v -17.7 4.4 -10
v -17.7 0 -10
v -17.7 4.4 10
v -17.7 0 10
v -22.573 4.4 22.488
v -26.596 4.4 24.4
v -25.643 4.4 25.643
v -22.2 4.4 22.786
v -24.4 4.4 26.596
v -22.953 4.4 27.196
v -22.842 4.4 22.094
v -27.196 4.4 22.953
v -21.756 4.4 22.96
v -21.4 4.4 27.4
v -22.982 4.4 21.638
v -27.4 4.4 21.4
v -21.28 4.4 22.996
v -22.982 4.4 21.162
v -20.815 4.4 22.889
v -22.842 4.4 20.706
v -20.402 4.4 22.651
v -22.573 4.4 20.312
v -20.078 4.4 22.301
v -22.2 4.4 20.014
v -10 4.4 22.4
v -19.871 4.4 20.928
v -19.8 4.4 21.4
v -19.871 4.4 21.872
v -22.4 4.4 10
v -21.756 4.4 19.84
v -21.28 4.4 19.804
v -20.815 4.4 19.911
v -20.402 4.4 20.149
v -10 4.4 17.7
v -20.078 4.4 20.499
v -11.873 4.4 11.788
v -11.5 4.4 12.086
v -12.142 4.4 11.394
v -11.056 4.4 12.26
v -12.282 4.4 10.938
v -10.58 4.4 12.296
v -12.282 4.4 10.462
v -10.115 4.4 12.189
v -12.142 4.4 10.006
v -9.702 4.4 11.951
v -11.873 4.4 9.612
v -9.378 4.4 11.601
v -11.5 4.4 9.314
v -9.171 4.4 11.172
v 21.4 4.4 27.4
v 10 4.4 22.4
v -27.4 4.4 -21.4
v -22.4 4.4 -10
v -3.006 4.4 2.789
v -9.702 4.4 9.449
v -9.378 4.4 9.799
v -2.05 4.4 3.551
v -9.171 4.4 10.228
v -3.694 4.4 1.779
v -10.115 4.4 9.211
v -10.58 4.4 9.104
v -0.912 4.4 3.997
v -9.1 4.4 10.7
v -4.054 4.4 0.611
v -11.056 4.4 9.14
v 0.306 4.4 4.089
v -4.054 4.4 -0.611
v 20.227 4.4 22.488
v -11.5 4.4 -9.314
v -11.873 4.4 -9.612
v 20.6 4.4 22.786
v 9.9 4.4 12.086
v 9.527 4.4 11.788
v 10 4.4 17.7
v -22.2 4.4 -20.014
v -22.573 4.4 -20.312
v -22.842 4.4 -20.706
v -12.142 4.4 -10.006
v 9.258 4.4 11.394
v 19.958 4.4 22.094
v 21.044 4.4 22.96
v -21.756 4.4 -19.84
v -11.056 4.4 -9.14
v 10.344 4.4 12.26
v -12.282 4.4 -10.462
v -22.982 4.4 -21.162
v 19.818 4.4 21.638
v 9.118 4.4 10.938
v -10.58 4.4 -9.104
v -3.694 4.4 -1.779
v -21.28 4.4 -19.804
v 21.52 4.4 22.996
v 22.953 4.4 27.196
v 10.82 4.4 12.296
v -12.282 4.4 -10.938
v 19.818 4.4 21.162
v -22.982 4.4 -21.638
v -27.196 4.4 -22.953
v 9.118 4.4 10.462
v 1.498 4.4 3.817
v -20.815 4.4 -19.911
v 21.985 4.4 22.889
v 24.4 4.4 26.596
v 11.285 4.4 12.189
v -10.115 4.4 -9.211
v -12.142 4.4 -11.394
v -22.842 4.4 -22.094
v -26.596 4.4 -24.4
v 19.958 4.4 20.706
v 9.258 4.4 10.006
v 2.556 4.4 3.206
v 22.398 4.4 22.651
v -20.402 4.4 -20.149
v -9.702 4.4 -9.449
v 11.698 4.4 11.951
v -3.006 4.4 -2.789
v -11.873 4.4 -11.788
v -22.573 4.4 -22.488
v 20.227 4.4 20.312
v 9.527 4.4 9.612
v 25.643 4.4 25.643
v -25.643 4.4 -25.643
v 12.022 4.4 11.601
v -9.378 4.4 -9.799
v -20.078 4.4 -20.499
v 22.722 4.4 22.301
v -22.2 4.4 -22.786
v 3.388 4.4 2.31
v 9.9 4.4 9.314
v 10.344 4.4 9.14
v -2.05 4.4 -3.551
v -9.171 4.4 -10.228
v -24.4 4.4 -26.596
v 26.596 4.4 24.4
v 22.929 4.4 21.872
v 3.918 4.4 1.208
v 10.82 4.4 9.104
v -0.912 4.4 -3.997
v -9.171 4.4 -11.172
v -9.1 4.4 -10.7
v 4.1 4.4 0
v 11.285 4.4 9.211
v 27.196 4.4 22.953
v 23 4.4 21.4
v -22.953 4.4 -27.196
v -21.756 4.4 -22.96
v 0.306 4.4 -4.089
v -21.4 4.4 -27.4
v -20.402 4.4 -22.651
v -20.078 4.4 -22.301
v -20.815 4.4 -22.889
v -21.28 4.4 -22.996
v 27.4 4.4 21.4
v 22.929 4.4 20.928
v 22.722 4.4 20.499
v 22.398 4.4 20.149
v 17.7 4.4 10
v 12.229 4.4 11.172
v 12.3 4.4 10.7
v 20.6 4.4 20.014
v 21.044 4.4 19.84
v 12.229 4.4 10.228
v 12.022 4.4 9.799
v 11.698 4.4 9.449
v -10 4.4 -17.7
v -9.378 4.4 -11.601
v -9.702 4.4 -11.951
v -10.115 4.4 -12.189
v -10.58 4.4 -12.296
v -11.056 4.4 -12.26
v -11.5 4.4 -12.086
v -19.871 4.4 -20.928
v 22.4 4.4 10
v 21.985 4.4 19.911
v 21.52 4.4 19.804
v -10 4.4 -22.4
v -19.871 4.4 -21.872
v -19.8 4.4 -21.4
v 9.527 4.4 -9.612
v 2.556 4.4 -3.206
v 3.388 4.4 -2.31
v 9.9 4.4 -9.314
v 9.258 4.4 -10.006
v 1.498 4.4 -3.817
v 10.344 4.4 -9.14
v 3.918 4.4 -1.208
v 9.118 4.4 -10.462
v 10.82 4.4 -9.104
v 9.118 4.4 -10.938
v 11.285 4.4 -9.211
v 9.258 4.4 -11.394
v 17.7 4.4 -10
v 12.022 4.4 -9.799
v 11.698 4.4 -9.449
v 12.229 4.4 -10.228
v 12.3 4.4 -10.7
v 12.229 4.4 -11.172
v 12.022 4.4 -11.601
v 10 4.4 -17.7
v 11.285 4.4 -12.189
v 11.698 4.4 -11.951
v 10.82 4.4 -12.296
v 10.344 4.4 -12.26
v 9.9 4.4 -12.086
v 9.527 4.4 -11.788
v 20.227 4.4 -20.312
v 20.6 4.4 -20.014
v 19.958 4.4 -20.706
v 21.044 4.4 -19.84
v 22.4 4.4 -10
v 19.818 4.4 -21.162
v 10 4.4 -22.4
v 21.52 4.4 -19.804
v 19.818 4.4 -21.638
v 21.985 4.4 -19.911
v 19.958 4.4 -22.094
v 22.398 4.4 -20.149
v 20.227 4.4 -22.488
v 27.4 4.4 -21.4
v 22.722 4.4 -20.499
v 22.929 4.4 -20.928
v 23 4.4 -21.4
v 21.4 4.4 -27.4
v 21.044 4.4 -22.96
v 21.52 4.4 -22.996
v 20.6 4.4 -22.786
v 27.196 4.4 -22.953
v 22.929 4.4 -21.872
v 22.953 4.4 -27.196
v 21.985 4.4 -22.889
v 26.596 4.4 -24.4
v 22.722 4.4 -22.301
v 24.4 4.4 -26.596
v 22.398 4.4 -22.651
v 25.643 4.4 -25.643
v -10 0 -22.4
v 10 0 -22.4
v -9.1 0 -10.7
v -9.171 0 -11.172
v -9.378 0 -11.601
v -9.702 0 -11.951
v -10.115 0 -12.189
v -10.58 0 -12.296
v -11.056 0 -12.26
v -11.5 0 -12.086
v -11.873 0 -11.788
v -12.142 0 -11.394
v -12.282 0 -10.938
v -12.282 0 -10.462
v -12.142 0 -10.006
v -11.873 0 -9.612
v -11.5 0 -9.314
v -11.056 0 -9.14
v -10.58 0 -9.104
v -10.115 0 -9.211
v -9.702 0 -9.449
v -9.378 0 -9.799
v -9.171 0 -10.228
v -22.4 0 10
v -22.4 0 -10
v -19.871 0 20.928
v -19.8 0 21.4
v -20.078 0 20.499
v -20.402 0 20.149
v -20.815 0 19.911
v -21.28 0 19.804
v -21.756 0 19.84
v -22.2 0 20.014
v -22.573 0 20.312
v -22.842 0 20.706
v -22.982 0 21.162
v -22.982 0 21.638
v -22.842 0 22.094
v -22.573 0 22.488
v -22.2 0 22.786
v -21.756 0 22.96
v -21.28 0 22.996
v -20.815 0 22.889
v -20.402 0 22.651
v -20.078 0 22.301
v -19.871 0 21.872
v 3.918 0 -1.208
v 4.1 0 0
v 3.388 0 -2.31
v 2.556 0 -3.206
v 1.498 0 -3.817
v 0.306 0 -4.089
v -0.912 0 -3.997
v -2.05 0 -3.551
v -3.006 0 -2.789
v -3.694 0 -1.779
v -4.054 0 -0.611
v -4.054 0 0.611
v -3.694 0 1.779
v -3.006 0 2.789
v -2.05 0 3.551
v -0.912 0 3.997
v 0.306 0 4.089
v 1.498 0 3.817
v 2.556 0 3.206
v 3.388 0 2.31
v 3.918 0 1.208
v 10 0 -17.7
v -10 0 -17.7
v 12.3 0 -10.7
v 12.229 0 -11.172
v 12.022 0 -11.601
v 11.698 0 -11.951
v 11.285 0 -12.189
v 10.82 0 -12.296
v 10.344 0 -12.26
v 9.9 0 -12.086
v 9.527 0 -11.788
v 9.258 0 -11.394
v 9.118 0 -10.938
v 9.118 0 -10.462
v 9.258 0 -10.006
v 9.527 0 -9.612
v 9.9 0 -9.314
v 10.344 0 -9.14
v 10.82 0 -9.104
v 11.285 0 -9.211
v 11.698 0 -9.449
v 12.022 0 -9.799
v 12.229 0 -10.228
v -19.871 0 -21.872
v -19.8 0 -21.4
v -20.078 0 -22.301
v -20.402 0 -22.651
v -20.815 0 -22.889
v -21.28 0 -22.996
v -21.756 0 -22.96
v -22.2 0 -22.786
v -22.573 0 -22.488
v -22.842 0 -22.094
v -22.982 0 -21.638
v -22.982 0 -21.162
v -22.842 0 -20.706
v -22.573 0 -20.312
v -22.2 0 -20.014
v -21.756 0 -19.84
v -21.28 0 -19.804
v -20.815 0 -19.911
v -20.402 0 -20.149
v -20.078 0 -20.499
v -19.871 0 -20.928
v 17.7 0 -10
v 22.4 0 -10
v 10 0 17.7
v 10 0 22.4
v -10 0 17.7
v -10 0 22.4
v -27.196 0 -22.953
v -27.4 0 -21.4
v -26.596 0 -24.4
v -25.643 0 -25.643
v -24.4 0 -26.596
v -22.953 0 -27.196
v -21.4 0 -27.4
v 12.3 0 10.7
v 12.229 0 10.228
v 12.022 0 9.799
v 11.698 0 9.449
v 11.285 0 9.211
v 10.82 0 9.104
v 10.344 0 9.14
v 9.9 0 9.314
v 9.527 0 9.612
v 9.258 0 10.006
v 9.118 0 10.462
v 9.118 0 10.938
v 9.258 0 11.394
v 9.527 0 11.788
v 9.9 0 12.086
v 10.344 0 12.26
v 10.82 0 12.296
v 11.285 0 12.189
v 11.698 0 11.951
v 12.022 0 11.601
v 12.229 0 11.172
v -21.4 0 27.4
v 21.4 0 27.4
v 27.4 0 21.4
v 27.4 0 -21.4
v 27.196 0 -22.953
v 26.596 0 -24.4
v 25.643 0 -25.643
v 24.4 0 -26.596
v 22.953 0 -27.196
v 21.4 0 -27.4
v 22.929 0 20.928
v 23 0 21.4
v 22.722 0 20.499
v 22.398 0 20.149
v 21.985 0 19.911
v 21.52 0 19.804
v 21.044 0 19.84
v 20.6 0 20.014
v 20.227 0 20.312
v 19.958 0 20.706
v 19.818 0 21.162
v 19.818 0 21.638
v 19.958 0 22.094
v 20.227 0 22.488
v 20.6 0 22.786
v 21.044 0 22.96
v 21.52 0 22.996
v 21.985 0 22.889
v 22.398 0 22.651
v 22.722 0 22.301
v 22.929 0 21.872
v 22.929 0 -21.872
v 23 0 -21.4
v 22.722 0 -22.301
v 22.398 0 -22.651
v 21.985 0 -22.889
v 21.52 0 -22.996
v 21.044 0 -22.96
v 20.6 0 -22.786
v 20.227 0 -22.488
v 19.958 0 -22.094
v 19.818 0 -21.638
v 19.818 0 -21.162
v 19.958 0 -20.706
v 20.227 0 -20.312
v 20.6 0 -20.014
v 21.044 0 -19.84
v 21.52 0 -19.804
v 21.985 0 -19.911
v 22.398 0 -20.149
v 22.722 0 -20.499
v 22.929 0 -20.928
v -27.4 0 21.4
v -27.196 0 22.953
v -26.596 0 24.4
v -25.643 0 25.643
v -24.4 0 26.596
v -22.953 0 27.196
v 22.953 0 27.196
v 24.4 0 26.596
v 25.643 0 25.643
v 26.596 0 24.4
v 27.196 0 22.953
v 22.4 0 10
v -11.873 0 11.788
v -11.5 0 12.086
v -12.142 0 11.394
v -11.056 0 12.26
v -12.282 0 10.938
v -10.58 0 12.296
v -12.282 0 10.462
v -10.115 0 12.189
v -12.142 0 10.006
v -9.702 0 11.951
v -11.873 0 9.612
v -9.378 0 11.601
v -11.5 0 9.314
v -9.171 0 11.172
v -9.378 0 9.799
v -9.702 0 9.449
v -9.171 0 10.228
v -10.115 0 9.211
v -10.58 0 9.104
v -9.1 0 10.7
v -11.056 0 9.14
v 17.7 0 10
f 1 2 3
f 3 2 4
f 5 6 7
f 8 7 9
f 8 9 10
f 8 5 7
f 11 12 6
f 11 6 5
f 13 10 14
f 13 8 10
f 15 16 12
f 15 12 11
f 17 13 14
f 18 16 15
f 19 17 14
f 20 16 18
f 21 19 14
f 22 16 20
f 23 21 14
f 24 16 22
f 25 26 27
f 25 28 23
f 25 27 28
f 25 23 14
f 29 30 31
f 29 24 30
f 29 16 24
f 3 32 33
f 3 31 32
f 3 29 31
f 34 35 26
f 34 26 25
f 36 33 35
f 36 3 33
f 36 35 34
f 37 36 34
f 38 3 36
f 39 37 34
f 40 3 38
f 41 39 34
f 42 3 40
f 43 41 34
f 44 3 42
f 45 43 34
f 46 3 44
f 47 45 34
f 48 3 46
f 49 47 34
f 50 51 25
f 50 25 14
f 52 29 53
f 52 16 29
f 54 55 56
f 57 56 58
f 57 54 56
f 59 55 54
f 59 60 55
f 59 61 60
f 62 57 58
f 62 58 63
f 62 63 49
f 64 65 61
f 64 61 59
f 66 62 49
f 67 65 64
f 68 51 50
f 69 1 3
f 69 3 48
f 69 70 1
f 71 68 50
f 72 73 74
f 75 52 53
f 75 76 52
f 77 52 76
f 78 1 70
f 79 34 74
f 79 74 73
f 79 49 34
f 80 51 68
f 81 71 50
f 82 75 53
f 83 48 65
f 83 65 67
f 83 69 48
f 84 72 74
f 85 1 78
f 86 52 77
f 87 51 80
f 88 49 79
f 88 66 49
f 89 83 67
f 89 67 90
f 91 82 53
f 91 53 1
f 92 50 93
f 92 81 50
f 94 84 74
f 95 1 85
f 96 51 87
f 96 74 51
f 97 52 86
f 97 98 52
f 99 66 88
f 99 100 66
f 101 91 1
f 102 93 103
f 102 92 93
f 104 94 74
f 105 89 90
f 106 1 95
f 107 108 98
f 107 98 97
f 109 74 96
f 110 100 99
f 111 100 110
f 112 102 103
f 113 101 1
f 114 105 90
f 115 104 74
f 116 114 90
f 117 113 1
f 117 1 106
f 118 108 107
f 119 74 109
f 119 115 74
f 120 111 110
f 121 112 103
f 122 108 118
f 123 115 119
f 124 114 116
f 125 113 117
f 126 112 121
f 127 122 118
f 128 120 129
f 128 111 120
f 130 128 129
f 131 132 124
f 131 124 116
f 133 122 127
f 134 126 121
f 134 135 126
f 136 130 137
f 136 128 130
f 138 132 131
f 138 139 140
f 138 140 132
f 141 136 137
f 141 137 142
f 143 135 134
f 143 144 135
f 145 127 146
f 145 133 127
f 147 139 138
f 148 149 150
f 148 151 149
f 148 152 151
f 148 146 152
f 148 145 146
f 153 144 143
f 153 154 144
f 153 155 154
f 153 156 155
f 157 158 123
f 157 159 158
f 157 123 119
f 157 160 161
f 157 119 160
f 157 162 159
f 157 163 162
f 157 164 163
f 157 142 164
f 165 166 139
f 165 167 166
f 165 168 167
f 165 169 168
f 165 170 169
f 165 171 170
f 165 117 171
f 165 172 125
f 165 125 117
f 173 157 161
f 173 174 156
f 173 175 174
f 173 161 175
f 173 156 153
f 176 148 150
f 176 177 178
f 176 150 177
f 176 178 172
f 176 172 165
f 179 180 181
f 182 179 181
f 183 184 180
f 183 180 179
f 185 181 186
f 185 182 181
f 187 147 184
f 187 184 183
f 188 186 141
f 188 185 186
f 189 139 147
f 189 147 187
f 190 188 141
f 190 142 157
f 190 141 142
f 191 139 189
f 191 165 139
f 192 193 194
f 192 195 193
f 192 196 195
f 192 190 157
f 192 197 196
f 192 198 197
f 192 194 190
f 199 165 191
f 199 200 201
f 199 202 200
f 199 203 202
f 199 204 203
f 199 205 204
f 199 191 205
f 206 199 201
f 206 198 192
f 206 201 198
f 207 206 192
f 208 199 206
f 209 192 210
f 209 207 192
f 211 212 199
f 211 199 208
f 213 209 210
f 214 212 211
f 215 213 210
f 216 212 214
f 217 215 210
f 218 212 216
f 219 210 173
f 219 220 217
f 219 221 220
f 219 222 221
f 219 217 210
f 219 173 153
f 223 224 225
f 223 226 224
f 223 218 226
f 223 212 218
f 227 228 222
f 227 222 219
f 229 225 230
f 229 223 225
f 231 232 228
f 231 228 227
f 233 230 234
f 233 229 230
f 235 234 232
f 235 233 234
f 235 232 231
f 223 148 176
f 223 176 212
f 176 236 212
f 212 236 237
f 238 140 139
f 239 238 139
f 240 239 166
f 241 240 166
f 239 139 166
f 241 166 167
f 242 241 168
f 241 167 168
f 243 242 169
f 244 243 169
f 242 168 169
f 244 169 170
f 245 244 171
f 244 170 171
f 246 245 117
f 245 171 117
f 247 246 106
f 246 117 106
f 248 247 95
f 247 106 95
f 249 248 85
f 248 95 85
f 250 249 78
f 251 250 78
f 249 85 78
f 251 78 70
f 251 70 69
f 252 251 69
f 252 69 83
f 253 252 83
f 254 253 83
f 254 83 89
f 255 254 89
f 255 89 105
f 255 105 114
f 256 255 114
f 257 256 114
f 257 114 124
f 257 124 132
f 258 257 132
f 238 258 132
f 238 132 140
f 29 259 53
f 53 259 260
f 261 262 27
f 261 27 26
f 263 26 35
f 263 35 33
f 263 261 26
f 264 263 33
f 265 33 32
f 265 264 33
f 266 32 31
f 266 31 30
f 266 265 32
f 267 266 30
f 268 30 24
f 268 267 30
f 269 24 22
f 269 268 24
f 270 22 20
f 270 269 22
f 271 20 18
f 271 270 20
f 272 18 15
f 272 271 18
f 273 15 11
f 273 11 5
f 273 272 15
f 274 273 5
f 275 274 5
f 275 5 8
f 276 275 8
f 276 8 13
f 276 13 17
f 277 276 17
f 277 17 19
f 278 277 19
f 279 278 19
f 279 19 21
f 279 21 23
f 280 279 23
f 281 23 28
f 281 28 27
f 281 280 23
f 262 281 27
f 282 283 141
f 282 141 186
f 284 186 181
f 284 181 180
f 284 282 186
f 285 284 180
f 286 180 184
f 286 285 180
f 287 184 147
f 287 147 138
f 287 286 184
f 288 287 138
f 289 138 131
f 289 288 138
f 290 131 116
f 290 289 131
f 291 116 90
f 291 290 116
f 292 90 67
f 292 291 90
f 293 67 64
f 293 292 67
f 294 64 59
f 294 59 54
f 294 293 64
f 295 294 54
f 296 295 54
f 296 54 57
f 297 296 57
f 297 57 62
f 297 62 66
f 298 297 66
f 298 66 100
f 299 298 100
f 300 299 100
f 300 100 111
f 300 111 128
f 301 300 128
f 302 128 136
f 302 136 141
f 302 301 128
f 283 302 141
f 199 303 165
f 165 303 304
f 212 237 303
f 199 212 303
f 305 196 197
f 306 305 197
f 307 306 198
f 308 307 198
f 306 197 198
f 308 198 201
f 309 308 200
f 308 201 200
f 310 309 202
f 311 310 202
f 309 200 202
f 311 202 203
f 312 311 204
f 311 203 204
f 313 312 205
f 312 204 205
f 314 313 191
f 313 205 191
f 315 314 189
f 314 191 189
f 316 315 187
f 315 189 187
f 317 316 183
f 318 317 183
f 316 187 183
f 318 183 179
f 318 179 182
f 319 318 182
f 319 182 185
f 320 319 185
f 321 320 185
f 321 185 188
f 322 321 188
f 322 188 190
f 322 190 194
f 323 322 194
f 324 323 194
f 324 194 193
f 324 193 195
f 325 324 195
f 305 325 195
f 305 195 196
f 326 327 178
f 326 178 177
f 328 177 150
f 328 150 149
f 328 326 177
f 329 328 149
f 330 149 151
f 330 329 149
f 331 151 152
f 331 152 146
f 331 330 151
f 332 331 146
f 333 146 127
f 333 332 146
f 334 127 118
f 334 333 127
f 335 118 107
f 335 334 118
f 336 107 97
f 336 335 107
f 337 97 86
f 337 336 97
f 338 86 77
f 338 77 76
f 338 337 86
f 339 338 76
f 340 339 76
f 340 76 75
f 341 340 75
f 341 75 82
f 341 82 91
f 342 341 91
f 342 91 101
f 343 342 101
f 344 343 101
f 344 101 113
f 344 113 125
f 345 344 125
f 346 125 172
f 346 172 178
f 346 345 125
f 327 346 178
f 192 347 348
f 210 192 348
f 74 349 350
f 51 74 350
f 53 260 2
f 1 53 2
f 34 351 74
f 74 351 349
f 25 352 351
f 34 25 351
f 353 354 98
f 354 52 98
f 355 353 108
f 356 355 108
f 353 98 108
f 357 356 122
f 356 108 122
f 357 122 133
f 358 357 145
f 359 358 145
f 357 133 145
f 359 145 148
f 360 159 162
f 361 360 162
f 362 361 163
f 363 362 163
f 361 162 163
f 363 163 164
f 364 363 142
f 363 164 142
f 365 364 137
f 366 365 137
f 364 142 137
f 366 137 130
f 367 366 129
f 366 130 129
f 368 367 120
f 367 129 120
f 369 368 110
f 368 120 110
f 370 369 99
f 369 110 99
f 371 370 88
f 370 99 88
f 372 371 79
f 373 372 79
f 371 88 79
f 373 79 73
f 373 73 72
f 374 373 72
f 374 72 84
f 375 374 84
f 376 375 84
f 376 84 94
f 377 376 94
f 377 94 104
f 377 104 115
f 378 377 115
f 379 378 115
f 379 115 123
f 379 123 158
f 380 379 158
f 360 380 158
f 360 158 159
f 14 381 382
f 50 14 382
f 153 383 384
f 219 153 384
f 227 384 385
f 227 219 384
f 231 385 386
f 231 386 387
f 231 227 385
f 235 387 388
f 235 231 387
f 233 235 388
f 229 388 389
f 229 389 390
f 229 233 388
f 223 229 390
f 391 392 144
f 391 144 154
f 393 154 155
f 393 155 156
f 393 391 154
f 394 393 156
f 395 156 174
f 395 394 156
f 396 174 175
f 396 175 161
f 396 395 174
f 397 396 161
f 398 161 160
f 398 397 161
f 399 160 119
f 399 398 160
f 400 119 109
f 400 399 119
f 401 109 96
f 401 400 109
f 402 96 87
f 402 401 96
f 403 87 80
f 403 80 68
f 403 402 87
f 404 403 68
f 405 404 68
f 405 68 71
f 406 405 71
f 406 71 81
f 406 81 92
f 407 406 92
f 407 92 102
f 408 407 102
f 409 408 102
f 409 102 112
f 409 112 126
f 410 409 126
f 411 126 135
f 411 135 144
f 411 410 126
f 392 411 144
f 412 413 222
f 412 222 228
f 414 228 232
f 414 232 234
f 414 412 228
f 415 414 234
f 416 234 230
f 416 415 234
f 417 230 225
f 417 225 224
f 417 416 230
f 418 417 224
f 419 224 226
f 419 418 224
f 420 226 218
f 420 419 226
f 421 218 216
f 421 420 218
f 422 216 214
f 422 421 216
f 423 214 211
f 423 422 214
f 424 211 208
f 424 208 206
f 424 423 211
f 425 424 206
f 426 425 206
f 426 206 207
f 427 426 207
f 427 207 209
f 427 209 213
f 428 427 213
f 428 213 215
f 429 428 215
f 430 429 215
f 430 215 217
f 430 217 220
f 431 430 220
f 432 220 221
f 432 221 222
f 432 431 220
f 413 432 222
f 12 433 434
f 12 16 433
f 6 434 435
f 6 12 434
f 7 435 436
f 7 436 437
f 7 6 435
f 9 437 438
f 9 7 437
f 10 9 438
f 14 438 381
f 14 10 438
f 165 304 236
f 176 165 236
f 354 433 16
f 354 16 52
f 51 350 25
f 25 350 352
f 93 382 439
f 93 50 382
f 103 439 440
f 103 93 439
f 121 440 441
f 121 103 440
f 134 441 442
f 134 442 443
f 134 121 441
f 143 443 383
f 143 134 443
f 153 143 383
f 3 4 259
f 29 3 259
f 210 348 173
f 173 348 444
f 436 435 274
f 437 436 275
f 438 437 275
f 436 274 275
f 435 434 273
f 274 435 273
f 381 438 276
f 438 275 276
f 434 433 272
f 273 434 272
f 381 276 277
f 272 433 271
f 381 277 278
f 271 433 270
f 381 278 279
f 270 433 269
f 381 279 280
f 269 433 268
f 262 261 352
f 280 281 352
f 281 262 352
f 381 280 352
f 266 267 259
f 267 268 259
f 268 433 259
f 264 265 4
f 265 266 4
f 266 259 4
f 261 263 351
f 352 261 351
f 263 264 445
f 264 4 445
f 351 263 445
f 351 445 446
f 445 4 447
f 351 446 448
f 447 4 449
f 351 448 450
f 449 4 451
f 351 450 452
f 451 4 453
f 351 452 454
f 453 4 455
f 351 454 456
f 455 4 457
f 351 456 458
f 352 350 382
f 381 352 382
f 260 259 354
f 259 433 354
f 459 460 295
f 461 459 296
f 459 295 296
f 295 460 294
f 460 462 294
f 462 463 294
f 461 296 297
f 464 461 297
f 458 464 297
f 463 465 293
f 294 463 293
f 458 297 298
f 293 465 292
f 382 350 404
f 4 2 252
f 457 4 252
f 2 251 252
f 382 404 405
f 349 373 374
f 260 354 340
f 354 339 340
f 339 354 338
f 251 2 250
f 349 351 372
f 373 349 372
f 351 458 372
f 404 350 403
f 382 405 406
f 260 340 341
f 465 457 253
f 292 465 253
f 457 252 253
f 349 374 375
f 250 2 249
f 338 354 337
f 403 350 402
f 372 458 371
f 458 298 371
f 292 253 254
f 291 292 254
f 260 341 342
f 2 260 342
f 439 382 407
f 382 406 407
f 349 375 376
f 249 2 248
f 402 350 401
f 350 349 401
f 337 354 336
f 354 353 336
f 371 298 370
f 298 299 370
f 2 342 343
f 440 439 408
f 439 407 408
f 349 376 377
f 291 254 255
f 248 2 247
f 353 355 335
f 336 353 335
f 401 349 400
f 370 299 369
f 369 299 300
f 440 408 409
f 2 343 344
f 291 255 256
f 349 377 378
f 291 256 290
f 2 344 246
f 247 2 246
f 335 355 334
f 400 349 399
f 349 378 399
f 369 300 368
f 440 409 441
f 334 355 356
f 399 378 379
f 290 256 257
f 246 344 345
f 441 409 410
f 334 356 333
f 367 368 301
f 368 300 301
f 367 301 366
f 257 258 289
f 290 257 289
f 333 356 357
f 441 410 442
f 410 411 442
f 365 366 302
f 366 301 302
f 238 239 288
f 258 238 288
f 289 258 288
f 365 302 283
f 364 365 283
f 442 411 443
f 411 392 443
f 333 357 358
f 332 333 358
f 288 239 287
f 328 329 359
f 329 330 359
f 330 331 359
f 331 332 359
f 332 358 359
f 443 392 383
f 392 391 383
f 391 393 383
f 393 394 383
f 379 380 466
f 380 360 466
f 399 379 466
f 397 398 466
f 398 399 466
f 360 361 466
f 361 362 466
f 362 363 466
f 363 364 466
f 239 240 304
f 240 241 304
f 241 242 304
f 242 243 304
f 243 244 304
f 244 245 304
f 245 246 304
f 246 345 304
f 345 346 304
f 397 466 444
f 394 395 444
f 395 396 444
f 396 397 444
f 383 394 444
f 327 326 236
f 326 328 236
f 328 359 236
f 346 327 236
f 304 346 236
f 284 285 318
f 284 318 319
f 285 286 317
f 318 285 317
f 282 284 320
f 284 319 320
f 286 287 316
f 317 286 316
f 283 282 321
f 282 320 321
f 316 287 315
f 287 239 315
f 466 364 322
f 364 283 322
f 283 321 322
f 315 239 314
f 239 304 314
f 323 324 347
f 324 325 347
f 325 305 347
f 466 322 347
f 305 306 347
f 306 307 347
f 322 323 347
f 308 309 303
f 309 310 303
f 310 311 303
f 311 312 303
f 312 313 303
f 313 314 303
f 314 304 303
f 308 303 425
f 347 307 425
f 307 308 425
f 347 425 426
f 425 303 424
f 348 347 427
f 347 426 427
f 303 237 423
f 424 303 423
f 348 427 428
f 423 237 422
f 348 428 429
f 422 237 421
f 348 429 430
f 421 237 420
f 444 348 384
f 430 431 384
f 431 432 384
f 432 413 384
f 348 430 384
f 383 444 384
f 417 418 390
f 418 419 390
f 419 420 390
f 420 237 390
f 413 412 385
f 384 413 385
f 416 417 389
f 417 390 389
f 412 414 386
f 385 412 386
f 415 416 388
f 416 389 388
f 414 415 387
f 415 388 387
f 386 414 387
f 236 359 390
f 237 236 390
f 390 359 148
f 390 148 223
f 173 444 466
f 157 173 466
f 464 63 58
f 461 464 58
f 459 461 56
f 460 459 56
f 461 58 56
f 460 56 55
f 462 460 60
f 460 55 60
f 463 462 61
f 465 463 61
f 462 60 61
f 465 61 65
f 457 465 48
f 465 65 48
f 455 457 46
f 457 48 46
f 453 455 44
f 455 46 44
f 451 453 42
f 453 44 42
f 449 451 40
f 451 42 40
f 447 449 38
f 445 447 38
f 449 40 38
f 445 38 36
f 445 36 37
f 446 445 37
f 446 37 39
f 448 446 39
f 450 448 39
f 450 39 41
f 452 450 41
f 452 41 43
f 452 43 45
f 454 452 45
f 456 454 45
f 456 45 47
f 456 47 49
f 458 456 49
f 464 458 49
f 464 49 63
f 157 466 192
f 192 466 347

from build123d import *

# Parameters (mm, degrees)
SKETCH_1_W          = 54.8
SKETCH_1_H          = 54.8
SKETCH_1_R          = 4.1
SKETCH_1_R_2        = 1.6
EXTRUDE_1_DEPTH     = 4.4
FILLET_1_R          = 6
SKETCH_2_R          = 1.6
CUT_EXTRUDE_1_DEPTH = 10


with BuildPart() as part:
    # 草图1 → 凸台-拉伸1 (new body)
    with BuildSketch(Plane(origin=(0, 0, 0), x_dir=(1, 0, 0), z_dir=(0, 1, 0))):
        Rectangle(SKETCH_1_W, SKETCH_1_H)
        Circle(SKETCH_1_R, mode=Mode.SUBTRACT)
        with Locations((21.4, 21.4)):
            Circle(SKETCH_1_R_2, mode=Mode.SUBTRACT)
        with Locations((21.4, -21.4)):
            Circle(SKETCH_1_R_2, mode=Mode.SUBTRACT)
        with Locations((-21.4, -21.4)):
            Circle(SKETCH_1_R_2, mode=Mode.SUBTRACT)
        with Locations((-21.4, 21.4)):
            Circle(SKETCH_1_R_2, mode=Mode.SUBTRACT)
        Polygon((17.7, -5), (17.7, 5), (17.7, 10), (22.4, 10), (22.4, 5), (22.4, -5), (22.4, -10), (17.7, -10), align=None, mode=Mode.SUBTRACT)
        Polygon((-5, 17.7), (-10, 17.7), (-10, 22.4), (-5, 22.4), (5, 22.4), (10, 22.4), (10, 17.7), (5, 17.7), align=None, mode=Mode.SUBTRACT)
        Polygon((5, -17.7), (10, -17.7), (10, -22.4), (5, -22.4), (-5, -22.4), (-10, -22.4), (-10, -17.7), (-5, -17.7), align=None, mode=Mode.SUBTRACT)
        Polygon((-17.7, 5), (-17.7, -5), (-17.7, -10), (-22.4, -10), (-22.4, -5), (-22.4, 5), (-22.4, 10), (-17.7, 10), align=None, mode=Mode.SUBTRACT)
    extrude(amount=EXTRUDE_1_DEPTH)

    # 圆角1
    fillet_1_edges = [part.edges().sort_by_distance(p)[0] for p in [
        (27.4, 2.2, 27.4),
        (-27.4, 2.2, 27.4),
        (-27.4, 2.2, -27.4),
        (27.4, 2.2, -27.4),
    ]]
    fillet(fillet_1_edges, radius=FILLET_1_R)

    # 草图2 → 切除-拉伸1 (cut)
    with BuildSketch(Plane(origin=(0, 4.4, 0), x_dir=(1, 0, 0), z_dir=(0, 1, 0))):
        with Locations((10.7, 10.7)):
            Circle(SKETCH_2_R)
        with Locations((10.7, -10.7)):
            Circle(SKETCH_2_R)
        with Locations((-10.7, -10.7)):
            Circle(SKETCH_2_R)
        with Locations((-10.7, 10.7)):
            Circle(SKETCH_2_R)
    extrude(amount=-CUT_EXTRUDE_1_DEPTH, mode=Mode.SUBTRACT)


solid = part.part
